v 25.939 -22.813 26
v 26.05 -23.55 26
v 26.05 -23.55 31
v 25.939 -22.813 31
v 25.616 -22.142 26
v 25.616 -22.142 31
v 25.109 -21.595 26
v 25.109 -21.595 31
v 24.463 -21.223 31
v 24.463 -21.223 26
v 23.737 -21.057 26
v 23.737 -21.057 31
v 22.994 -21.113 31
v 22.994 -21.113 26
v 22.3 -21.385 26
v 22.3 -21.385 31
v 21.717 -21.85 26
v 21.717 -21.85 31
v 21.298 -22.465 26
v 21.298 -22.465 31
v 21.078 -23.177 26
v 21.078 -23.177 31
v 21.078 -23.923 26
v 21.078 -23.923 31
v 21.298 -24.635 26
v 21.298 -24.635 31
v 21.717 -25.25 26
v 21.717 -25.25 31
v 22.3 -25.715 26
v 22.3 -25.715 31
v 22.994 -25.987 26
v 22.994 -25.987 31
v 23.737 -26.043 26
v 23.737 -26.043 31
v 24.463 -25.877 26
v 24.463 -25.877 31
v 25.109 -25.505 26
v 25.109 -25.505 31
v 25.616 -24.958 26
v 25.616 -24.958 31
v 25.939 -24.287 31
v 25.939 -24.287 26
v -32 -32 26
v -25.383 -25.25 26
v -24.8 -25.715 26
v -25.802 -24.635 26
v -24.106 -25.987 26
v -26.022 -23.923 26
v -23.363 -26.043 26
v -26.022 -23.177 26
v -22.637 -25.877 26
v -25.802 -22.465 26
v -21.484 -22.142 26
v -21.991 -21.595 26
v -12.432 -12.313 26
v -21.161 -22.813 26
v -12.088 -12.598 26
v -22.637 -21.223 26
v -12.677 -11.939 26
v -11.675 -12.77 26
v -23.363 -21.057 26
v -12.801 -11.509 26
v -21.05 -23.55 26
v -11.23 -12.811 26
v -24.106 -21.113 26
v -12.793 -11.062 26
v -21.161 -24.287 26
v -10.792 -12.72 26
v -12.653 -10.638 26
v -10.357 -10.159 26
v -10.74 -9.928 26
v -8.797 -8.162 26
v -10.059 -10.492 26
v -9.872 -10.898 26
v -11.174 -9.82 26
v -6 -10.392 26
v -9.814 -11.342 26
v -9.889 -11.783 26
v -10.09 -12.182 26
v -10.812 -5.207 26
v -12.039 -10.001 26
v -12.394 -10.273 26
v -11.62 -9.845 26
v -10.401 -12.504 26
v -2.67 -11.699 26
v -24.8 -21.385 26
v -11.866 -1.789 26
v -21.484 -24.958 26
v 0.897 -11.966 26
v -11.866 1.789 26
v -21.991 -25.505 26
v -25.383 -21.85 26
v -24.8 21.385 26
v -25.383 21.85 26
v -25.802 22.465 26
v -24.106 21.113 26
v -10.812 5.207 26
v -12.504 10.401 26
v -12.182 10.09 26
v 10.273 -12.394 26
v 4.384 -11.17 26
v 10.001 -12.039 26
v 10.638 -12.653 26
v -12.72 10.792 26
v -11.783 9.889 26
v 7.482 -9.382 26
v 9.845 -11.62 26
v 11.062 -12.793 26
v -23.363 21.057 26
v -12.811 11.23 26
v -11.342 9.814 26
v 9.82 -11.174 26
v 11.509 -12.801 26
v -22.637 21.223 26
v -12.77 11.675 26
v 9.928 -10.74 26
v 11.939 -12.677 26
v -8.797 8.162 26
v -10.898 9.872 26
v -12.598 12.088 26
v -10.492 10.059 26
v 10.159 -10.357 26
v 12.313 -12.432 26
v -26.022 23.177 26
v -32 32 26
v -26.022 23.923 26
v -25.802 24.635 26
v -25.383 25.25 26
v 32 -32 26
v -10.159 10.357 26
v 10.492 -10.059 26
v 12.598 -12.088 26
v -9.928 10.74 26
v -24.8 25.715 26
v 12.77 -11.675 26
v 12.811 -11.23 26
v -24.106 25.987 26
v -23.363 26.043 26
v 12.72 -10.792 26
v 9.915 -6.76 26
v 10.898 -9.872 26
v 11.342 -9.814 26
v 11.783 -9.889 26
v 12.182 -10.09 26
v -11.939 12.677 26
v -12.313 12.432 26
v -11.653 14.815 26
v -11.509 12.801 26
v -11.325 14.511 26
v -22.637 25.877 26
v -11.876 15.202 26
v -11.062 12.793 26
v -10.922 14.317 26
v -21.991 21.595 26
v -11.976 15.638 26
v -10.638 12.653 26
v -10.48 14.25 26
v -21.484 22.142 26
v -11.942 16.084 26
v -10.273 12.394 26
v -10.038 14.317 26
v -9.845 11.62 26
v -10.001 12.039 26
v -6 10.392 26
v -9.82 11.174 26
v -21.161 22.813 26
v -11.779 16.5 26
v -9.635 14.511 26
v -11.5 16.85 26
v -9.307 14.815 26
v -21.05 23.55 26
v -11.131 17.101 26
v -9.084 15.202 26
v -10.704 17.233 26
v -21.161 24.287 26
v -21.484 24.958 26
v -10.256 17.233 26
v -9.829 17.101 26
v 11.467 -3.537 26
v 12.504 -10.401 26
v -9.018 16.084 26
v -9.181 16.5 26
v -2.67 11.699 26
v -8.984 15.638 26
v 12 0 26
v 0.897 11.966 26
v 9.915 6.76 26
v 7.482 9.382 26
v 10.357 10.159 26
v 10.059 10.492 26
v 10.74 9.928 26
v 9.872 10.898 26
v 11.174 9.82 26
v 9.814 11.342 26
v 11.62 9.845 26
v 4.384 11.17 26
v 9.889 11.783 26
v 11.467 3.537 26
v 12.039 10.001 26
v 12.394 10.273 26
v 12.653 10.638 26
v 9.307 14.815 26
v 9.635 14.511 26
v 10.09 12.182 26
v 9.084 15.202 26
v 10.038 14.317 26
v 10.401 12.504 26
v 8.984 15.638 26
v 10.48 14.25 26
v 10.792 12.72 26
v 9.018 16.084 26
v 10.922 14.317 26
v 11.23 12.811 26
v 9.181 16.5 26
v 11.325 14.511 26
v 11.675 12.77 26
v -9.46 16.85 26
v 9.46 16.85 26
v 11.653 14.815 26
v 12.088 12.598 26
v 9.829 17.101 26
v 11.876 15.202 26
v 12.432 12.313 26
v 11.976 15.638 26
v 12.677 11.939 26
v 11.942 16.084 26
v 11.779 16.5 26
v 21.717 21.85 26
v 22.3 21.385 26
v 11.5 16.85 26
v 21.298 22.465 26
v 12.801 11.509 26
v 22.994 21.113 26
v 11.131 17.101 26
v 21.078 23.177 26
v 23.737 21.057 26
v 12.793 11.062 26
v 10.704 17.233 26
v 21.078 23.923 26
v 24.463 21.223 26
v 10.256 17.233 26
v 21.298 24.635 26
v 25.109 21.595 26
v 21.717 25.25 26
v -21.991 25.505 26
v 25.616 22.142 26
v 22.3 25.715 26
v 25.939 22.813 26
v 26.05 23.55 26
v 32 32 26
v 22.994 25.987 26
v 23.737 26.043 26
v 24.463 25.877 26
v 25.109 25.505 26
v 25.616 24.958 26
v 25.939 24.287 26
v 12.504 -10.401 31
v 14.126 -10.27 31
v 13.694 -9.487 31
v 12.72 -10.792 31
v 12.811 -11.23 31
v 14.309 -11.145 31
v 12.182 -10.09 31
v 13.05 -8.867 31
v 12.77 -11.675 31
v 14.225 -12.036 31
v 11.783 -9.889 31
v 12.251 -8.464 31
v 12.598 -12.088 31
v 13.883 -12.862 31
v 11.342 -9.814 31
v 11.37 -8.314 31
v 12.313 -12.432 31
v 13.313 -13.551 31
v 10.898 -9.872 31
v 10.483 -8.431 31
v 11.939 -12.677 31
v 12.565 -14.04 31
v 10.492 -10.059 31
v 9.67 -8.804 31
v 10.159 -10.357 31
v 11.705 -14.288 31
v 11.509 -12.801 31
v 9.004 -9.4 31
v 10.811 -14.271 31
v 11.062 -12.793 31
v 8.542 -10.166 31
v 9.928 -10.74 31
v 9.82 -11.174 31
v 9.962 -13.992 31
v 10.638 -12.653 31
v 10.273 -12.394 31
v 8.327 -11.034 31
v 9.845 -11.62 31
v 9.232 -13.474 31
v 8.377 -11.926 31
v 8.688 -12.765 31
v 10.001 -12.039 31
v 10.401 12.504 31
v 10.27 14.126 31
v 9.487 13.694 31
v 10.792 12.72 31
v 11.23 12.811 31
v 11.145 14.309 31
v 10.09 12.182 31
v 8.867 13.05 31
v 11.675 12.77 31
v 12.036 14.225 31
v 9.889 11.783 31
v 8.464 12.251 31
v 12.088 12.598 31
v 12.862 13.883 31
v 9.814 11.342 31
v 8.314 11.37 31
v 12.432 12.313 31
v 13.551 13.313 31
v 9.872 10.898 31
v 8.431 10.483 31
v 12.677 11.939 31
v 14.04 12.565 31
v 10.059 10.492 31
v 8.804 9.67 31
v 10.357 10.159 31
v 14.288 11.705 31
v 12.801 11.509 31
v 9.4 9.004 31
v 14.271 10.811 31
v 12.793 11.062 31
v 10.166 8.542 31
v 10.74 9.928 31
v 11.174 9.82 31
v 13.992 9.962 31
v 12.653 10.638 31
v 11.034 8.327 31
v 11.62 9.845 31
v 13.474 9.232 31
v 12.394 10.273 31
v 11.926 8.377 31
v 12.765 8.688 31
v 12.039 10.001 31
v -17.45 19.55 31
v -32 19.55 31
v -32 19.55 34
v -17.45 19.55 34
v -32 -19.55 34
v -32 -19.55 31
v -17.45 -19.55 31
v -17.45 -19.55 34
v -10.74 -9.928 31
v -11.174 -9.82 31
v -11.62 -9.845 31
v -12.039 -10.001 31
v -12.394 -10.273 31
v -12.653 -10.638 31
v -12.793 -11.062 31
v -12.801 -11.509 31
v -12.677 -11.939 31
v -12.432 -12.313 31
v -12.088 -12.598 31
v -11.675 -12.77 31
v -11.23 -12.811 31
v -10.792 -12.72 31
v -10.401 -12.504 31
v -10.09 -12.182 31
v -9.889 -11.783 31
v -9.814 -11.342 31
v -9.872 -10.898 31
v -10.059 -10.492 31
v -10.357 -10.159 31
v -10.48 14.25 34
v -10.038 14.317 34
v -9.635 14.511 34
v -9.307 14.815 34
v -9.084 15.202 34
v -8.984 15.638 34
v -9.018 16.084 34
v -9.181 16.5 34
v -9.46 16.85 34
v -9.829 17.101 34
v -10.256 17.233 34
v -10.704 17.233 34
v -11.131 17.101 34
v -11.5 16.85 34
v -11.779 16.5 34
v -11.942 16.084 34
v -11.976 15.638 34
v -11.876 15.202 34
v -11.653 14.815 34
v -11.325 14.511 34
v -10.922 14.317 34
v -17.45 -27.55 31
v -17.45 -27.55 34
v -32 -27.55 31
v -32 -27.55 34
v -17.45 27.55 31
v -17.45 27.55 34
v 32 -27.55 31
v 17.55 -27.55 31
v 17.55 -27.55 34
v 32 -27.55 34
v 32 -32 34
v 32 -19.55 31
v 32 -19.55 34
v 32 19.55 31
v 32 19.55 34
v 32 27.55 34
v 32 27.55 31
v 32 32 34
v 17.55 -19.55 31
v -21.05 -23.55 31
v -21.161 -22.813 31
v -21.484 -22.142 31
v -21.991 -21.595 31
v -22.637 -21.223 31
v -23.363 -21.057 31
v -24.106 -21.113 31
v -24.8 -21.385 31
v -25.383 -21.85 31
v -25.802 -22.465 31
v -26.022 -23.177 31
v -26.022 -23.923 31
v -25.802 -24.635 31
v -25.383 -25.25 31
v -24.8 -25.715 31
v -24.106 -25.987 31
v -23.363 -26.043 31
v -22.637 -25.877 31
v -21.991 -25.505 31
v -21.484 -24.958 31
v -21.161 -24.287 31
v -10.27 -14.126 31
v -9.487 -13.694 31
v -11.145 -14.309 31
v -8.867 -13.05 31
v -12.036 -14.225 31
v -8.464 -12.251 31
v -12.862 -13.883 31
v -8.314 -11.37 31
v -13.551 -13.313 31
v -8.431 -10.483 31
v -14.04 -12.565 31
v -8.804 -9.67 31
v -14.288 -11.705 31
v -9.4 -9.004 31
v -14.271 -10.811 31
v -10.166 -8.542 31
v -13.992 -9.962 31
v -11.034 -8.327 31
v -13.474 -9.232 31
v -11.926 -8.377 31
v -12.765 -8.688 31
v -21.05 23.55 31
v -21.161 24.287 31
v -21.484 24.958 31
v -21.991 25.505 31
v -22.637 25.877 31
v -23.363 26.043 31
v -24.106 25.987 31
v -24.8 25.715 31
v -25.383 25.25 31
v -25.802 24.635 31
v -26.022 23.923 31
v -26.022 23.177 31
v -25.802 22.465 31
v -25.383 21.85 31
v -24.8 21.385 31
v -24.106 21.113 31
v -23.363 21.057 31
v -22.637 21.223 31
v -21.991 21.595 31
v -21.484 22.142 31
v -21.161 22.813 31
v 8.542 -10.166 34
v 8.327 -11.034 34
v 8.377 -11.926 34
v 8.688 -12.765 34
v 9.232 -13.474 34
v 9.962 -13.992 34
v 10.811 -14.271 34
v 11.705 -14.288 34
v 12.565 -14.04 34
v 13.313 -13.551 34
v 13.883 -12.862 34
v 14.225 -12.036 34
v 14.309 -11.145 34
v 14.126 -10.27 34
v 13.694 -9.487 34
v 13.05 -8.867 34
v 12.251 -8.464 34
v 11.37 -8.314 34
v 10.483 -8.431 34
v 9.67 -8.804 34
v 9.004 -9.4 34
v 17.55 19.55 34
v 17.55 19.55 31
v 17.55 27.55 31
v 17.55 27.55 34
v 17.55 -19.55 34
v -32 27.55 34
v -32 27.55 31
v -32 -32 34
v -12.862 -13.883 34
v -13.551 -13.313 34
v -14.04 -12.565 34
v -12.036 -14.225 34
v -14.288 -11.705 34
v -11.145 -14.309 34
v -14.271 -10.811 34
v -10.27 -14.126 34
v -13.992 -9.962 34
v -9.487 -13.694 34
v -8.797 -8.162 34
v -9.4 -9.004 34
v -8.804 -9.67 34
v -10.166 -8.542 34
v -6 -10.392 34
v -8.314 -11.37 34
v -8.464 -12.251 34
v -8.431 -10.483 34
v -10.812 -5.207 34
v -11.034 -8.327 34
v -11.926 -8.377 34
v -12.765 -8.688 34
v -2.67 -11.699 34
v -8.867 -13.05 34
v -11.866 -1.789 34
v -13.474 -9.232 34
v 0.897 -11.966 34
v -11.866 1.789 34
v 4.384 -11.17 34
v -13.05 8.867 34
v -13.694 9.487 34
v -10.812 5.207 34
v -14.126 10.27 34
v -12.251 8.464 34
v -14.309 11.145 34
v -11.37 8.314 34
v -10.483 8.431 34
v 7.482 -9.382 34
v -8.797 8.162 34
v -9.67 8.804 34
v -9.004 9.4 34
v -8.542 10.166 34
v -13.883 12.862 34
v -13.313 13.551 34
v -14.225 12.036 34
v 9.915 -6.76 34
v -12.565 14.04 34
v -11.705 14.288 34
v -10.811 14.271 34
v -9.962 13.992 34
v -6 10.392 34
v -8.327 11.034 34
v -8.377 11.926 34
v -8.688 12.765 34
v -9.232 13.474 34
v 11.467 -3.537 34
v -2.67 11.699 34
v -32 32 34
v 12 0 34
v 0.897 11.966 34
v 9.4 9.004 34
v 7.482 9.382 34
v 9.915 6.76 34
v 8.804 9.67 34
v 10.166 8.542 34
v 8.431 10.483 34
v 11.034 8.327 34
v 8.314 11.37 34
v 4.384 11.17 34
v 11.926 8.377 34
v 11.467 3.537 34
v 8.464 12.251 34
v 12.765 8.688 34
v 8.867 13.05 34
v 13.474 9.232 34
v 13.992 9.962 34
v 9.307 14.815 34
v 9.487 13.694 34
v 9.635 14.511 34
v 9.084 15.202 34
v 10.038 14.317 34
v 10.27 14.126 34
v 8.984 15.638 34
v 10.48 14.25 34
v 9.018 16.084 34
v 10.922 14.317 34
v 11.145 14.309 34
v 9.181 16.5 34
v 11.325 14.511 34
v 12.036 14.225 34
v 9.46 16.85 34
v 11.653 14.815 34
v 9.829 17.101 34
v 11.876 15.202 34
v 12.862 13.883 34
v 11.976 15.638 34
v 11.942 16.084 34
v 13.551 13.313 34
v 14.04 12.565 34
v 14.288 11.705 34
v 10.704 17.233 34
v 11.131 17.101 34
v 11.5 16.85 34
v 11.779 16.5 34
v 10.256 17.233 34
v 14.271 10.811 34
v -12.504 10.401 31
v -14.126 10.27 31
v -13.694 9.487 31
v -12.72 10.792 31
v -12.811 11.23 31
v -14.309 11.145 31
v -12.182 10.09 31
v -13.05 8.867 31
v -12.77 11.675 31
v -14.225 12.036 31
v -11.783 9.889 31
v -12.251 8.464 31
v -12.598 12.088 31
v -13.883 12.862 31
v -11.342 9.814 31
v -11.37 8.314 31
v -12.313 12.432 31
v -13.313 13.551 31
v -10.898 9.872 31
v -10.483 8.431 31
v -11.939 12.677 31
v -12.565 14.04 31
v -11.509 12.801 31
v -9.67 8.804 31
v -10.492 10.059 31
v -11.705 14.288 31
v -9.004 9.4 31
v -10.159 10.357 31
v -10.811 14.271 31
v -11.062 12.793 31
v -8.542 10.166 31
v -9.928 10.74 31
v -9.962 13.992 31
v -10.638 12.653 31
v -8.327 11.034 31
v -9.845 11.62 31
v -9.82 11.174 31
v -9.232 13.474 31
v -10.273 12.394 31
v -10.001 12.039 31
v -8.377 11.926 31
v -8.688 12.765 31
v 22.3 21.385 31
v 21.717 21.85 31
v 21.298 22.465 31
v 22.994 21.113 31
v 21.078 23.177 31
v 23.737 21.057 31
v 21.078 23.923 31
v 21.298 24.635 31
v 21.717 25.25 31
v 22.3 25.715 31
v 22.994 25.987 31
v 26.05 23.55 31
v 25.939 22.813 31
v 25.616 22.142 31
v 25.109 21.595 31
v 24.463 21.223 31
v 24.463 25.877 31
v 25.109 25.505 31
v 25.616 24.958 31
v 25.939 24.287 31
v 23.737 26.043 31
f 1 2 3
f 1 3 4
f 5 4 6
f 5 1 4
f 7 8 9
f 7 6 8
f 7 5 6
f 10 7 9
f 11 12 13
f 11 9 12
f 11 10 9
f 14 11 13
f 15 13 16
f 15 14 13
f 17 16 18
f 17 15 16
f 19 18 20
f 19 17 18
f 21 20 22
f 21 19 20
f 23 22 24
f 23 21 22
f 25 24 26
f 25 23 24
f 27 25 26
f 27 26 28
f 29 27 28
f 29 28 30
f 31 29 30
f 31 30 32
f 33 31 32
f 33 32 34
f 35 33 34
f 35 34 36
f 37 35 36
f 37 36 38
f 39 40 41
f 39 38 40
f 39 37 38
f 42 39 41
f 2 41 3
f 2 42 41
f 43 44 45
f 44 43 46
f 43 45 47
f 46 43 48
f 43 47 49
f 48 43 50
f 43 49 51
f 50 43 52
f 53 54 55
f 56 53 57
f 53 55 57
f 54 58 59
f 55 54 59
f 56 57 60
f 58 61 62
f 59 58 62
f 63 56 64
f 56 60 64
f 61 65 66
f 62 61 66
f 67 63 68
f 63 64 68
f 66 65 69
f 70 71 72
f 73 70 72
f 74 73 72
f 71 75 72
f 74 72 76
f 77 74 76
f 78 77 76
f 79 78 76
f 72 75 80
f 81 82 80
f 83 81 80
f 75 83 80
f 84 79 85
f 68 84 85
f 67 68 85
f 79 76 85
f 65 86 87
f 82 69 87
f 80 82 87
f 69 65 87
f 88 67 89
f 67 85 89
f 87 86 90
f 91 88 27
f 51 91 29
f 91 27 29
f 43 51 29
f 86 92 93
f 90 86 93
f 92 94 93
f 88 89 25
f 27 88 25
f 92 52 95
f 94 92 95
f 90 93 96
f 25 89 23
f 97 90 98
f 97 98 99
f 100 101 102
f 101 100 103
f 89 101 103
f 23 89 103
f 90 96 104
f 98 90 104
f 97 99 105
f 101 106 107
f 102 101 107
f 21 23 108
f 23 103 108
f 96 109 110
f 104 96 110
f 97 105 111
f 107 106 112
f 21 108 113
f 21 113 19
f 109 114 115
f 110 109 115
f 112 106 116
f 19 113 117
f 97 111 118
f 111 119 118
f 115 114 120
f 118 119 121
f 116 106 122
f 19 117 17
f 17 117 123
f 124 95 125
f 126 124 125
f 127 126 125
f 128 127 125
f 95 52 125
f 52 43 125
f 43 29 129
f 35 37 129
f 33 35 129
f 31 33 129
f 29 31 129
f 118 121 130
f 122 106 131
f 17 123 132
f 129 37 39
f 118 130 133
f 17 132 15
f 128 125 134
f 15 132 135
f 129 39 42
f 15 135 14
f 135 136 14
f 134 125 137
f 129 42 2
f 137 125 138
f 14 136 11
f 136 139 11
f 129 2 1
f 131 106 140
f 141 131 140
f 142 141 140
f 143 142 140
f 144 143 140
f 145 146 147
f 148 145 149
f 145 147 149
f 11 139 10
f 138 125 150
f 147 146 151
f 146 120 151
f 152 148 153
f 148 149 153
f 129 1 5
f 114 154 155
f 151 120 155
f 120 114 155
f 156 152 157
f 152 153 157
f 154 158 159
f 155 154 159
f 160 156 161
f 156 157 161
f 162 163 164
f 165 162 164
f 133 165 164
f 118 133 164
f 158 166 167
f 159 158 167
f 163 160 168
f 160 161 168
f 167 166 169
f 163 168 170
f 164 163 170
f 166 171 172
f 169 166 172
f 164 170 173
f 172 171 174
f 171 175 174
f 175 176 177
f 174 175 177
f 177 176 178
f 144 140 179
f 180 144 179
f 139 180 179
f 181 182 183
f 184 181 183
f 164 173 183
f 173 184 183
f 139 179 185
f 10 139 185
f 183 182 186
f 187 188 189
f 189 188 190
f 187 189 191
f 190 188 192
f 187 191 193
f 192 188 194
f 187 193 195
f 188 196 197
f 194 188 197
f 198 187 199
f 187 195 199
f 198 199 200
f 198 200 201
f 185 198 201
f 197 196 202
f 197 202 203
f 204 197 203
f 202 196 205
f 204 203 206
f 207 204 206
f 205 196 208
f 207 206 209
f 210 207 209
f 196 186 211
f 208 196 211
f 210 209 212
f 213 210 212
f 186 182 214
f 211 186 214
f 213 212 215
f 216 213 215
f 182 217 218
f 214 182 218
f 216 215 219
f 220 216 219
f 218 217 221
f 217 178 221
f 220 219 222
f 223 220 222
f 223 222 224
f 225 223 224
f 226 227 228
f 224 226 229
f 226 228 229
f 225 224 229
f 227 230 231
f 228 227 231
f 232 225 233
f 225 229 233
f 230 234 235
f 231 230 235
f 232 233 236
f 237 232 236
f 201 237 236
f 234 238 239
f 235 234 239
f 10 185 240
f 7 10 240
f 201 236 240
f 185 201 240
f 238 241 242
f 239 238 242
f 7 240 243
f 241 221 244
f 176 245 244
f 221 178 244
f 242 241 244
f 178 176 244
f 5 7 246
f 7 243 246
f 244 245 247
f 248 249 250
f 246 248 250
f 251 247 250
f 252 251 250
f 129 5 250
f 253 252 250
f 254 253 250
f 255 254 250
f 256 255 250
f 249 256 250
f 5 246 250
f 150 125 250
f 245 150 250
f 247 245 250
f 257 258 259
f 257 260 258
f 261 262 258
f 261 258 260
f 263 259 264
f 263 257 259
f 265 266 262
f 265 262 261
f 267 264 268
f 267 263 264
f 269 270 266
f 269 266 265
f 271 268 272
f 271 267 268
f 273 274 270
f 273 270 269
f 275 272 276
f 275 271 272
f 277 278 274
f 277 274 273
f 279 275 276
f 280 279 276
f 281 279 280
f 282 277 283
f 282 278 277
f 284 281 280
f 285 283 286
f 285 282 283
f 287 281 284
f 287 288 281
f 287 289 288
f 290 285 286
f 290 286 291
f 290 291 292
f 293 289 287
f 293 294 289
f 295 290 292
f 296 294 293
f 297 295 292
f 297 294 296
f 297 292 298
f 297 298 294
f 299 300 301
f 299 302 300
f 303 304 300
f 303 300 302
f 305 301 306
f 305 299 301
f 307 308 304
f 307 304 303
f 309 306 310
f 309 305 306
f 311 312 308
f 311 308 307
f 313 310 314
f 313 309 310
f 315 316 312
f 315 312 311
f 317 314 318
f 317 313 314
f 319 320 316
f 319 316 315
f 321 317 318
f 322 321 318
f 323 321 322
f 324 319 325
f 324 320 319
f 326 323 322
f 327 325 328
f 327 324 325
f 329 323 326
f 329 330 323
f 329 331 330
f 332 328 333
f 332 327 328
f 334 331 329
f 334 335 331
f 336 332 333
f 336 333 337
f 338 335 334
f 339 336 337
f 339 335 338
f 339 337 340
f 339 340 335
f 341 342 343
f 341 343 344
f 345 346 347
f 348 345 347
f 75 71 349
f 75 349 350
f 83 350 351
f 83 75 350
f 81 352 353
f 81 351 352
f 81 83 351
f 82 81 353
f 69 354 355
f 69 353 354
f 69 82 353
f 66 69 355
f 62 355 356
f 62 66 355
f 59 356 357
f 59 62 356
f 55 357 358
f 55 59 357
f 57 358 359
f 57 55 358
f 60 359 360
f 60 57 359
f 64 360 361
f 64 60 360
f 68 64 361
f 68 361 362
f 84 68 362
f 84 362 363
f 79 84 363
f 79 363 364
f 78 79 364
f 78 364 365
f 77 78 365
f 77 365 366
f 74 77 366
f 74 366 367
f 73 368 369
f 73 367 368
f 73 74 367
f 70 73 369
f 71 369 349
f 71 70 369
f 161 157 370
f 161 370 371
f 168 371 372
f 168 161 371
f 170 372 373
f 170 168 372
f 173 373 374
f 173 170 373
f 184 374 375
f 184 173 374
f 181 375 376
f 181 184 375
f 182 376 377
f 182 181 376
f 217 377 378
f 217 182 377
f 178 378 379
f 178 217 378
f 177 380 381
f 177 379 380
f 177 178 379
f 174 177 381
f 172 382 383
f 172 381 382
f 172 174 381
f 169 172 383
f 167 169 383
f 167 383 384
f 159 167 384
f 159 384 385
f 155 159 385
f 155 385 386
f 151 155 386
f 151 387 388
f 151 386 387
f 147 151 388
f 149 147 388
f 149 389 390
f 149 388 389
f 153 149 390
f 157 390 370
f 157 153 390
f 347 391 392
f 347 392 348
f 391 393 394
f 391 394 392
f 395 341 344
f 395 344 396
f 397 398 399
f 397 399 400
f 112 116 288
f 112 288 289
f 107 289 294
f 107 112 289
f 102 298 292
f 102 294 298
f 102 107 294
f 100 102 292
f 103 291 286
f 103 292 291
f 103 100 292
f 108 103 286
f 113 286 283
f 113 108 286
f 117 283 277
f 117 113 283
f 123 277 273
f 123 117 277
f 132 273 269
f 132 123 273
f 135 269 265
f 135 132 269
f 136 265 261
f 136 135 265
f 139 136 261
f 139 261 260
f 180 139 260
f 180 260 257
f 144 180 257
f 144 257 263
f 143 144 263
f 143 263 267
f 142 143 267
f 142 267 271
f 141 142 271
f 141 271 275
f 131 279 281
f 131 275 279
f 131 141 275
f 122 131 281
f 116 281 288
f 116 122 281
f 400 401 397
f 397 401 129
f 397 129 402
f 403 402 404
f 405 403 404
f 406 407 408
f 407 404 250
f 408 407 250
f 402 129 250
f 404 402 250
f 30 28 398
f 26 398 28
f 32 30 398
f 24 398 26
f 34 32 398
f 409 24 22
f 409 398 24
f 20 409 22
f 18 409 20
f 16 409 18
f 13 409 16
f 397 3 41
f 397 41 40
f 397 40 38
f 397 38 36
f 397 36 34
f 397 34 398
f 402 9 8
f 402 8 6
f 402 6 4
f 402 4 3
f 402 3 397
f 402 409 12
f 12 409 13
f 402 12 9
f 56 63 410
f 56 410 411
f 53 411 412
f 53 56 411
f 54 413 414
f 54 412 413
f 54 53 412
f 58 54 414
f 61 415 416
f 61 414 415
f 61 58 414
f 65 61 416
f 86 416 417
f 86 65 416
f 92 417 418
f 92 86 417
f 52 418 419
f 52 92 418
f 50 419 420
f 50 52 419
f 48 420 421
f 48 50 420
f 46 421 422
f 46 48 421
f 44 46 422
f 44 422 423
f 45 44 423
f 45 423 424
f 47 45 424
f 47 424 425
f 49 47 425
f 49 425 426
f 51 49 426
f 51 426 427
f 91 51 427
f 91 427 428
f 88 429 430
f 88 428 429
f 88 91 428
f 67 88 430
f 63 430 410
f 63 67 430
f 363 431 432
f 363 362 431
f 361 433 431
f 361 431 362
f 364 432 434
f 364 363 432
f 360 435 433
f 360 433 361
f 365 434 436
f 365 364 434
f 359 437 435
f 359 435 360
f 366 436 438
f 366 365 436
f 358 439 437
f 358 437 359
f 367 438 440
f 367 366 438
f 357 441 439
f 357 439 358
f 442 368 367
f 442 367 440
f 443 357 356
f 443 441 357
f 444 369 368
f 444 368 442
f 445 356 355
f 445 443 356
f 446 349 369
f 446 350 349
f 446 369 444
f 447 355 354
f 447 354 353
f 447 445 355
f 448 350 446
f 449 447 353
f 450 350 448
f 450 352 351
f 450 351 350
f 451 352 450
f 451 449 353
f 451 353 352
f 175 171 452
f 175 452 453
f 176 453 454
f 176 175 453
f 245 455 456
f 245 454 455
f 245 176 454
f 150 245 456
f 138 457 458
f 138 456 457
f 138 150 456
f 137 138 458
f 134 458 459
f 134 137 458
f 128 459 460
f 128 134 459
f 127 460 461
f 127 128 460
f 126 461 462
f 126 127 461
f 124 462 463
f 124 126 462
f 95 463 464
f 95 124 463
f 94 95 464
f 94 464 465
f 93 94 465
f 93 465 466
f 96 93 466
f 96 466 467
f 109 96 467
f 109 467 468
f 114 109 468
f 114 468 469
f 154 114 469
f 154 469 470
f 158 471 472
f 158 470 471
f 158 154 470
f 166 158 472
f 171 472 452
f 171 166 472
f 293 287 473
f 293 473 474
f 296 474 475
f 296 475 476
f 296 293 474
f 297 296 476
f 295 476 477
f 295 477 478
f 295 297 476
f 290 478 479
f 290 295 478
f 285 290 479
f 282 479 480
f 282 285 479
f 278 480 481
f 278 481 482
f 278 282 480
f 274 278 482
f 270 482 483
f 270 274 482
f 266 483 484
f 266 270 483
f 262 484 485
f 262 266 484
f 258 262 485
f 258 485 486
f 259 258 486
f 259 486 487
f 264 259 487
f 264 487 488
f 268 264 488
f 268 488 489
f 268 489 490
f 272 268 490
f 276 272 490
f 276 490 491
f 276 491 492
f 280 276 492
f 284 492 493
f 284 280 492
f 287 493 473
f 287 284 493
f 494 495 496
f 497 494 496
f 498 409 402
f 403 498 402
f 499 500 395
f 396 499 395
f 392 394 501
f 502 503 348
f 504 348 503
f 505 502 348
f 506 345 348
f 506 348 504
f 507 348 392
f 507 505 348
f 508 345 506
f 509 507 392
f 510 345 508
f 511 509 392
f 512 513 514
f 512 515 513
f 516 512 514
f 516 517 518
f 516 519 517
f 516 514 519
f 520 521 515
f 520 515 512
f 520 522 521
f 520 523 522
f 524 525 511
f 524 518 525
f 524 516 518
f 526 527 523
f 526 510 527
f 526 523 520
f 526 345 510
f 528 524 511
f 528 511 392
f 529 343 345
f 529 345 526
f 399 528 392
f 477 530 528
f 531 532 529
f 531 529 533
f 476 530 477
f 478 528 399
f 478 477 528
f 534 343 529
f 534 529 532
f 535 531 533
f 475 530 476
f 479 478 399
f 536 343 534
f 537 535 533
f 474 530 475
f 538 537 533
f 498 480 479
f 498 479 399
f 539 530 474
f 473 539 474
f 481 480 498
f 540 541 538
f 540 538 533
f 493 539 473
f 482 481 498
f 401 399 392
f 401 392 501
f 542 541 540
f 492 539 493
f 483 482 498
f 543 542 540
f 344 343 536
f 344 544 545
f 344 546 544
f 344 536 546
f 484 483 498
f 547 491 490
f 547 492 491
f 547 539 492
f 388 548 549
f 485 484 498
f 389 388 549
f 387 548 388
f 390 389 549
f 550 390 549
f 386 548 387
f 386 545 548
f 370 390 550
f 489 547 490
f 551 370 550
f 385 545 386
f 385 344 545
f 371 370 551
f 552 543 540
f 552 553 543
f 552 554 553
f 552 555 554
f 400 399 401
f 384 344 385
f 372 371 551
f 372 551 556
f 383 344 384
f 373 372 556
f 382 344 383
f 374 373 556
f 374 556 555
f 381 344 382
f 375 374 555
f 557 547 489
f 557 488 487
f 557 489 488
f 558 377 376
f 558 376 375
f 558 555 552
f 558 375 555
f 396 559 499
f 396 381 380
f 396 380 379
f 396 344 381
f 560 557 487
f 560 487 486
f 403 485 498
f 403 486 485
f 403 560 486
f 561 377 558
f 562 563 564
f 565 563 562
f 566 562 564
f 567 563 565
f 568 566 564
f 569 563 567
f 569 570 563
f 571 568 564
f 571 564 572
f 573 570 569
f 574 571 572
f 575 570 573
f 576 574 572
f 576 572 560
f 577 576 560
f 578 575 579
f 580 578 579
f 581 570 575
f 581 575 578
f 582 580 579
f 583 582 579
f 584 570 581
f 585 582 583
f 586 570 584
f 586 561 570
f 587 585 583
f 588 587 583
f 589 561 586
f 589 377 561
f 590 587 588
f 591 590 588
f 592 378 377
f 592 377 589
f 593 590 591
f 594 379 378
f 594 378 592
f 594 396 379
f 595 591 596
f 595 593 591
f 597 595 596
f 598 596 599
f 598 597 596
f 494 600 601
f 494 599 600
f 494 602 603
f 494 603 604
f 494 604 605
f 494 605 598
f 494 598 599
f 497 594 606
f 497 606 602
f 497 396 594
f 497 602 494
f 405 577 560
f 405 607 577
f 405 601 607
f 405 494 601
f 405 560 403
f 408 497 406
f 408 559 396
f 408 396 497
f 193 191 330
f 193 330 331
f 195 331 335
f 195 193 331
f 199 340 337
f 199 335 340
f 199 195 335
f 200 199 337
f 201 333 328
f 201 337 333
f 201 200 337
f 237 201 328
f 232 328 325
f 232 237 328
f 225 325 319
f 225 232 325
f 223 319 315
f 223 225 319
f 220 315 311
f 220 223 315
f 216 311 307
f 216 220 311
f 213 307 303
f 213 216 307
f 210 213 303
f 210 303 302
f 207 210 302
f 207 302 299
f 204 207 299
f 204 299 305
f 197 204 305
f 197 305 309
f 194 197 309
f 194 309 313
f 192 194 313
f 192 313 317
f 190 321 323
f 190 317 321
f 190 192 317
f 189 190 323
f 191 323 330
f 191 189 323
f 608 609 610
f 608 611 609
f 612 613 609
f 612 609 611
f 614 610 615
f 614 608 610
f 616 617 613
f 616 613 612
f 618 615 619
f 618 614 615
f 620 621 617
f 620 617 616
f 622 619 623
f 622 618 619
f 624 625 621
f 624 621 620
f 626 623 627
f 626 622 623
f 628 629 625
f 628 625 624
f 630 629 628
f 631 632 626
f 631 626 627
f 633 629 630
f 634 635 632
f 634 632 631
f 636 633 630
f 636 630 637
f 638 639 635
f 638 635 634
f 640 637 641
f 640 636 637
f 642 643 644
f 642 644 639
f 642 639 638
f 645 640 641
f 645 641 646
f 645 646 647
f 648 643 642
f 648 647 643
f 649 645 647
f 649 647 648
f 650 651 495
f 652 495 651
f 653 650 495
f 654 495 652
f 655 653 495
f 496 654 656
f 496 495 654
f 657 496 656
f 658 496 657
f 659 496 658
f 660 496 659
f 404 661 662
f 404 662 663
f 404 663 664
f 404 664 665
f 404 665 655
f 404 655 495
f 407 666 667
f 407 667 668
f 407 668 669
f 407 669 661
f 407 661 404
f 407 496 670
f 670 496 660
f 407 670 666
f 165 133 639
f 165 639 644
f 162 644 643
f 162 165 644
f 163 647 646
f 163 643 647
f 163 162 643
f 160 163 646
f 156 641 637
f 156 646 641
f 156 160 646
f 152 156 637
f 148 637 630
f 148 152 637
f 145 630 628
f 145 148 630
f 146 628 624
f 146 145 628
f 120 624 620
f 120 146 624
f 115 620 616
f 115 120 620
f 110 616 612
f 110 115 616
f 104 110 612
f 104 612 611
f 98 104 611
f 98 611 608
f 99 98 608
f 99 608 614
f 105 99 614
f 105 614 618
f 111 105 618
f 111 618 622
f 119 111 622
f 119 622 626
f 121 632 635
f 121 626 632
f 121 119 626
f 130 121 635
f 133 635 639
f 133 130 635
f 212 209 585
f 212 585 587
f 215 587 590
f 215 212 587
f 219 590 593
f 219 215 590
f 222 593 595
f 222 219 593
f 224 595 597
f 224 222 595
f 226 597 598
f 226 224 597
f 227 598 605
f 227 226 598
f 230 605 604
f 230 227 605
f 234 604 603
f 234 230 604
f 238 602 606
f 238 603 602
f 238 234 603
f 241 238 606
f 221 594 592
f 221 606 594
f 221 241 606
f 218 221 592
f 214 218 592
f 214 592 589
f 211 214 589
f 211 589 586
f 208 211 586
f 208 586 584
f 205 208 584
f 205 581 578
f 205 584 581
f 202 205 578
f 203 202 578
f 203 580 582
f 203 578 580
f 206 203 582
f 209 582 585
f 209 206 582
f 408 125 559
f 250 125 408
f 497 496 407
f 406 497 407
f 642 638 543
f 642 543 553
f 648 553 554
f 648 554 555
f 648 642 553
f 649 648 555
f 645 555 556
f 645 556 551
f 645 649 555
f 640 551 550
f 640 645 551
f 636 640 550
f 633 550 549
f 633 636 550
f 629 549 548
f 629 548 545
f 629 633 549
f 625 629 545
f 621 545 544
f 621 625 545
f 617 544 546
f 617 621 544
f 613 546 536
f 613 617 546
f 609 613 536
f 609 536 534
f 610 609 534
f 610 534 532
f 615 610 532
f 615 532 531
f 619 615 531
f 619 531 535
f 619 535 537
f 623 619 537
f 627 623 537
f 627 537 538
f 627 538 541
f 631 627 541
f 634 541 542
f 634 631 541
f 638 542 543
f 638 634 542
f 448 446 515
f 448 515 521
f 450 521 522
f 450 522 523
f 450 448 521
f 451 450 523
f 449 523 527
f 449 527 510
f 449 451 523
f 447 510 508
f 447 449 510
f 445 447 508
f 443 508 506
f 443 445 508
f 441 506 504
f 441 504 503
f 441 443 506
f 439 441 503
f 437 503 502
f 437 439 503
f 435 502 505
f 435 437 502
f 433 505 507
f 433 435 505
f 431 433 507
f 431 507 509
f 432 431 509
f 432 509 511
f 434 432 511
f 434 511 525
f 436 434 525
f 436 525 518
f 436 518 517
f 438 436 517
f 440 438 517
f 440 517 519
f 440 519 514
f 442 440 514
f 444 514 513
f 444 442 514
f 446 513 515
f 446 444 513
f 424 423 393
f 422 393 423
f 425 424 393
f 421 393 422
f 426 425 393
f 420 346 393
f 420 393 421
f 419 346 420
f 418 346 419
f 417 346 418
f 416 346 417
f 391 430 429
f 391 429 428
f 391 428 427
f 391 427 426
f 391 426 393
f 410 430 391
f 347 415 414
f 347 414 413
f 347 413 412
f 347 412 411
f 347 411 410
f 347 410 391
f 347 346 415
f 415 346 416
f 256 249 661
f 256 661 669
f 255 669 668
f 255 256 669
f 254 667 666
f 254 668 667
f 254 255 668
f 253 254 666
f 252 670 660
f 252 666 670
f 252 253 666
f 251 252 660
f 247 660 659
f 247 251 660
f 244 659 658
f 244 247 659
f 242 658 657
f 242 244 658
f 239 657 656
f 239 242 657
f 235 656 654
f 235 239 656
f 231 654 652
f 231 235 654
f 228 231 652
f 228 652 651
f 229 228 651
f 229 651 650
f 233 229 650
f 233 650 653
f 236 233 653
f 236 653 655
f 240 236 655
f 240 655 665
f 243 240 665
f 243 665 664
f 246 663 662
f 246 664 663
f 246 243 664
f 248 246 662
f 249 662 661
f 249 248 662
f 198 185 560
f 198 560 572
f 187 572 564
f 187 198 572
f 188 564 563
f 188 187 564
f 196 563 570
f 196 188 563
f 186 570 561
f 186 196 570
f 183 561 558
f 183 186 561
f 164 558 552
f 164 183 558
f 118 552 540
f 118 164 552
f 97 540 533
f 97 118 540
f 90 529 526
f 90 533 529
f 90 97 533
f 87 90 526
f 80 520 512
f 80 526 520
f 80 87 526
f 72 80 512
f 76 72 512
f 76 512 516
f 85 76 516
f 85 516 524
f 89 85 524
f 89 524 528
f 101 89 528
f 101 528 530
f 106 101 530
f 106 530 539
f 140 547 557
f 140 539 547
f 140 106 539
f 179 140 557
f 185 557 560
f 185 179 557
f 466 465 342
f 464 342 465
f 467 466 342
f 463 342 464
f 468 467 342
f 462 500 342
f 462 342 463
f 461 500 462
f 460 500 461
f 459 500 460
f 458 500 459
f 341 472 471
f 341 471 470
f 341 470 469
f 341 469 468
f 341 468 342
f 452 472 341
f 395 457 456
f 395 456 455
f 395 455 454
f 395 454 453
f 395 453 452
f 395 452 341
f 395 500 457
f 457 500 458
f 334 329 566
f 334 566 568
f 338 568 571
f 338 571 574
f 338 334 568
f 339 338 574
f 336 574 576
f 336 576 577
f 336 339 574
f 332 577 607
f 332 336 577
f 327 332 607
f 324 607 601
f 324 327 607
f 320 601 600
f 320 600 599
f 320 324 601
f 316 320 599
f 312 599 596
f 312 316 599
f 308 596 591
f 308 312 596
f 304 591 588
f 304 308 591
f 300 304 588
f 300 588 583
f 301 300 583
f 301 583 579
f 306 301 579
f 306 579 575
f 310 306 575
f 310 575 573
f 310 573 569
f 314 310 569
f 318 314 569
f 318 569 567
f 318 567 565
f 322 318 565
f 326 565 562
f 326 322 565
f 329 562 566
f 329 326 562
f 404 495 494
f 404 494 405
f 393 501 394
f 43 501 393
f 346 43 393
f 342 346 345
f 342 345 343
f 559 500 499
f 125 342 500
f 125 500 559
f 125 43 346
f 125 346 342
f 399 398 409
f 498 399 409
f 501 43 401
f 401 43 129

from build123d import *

# Parameters (mm, degrees)
CYLINDER776_R                = 1.5
CYLINDER776_DEPTH            = 20
CYLINDER774_R                = 1.5
CYLINDER774_DEPTH            = 20
COMPOUND536_ROLL_ANGLE       = 90
COMPOUND536_PLACEMENT_ANGLE  = 90
BOX640_W                     = 16
BOX640_H                     = 8
BOX640_DEPTH                 = 3
BOX639_W                     = 16
BOX639_H                     = 8
BOX639_DEPTH                 = 3
BOX636_W                     = 16
BOX636_H                     = 8
BOX636_DEPTH                 = 3
BOX637_W                     = 16
BOX637_H                     = 8
BOX637_DEPTH                 = 3
CYLINDER1600_R               = 12
CYLINDER1600_DEPTH           = 20
CYLINDER1598_R               = 5
CYLINDER1598_DEPTH           = 4
CYLINDER1605_R               = 5
CYLINDER1605_DEPTH           = 4
CYLINDER1612_R               = 5
CYLINDER1612_DEPTH           = 4
CYLINDER1610_R               = 5
CYLINDER1610_DEPTH           = 4
CYLINDER1604_R               = 2.5
CYLINDER1604_DEPTH           = 20
CYLINDER1608_R               = 2.5
CYLINDER1608_DEPTH           = 20
CYLINDER1607_R               = 2.5
CYLINDER1607_DEPTH           = 20
CYLINDER1602_R               = 2.5
CYLINDER1602_DEPTH           = 20
CYLINDER1609_R               = 3
CYLINDER1609_DEPTH           = 3
CYLINDER1609_PLACEMENT_ANGLE = 22.5
CYLINDER1601_R               = 3
CYLINDER1601_DEPTH           = 3
CYLINDER1601_PLACEMENT_ANGLE = 67.5
CYLINDER1606_R               = 3
CYLINDER1606_DEPTH           = 3
CYLINDER1606_PLACEMENT_ANGLE = 202.5
CYLINDER1611_R               = 3
CYLINDER1611_DEPTH           = 3
CYLINDER1611_PLACEMENT_ANGLE = 112.5
COMPOUND801_PLACEMENT_ANGLE  = 45
CYLINDER1603_R               = 1.5
CYLINDER1603_DEPTH           = 30
CYLINDER1603_PLACEMENT_ANGLE = 22.5
CYLINDER1613_R               = 1.5
CYLINDER1613_DEPTH           = 30
CYLINDER1613_PLACEMENT_ANGLE = 67.5
CYLINDER1614_R               = 1.5
CYLINDER1614_DEPTH           = 30
CYLINDER1614_PLACEMENT_ANGLE = 202.5
CYLINDER1599_R               = 1.5
CYLINDER1599_DEPTH           = 30
CYLINDER1599_PLACEMENT_ANGLE = 112.5
COMPOUND802_PLACEMENT_ANGLE  = 45
BOX638_W                     = 64
BOX638_H                     = 64
BOX638_DEPTH                 = 8


with BuildPart() as v_lec776:
    # Cylinder776 → Cylinder776 (new body)
    with BuildSketch(Plane(origin=(15.75, 114, 59.48), x_dir=(-1, 0, 0), z_dir=(0, 1, 0))):
        Circle(CYLINDER776_R)
    extrude(amount=CYLINDER776_DEPTH)


with BuildPart() as compound536:
    # Cylinder774 → Cylinder774 (new body)
    with BuildSketch(Plane(origin=(15.75, 114, 38.52), x_dir=(-1, 0, 0), z_dir=(0, 1, 0))):
        Circle(CYLINDER774_R)
    extrude(amount=CYLINDER774_DEPTH)

    # Compound536: union Válec776
    add(v_lec776.part)


with BuildPart() as compound536_1:
    # Compound536 roll: moved
    add(compound536.part.rotate(Axis((0, 0, 0), (1, 0, 0)), COMPOUND536_ROLL_ANGLE))


with BuildPart() as compound536_2:
    # Compound536 placement: moved
    add(compound536_1.part.moved(Location((-49, 0, -96))).rotate(Axis((-49, 0, -96), (0, 0, 1)), COMPOUND536_PLACEMENT_ANGLE))


with BuildPart() as krychle640:
    # Box640 → Box640 (new body)
    with BuildSketch(Plane(origin=(17.55, -27.55, 31), x_dir=(1, 0, 0), z_dir=(0, 0, 1))):
        with Locations((8, 4)):
            Rectangle(BOX640_W, BOX640_H)
    extrude(amount=BOX640_DEPTH)


with BuildPart() as krychle639:
    # Box639 → Box639 (new body)
    with BuildSketch(Plane(origin=(-33.45, 19.55, 31), x_dir=(1, 0, 0), z_dir=(0, 0, 1))):
        with Locations((8, 4)):
            Rectangle(BOX639_W, BOX639_H)
    extrude(amount=BOX639_DEPTH)


with BuildPart() as krychle636:
    # Box636 → Box636 (new body)
    with BuildSketch(Plane(origin=(-33.45, -27.55, 31), x_dir=(1, 0, 0), z_dir=(0, 0, 1))):
        with Locations((8, 4)):
            Rectangle(BOX636_W, BOX636_H)
    extrude(amount=BOX636_DEPTH)


with BuildPart() as compound800:
    # Box637 → Box637 (new body)
    with BuildSketch(Plane(origin=(17.55, 19.55, 31), x_dir=(1, 0, 0), z_dir=(0, 0, 1))):
        with Locations((8, 4)):
            Rectangle(BOX637_W, BOX637_H)
    extrude(amount=BOX637_DEPTH)

    # Compound800: union Krychle640, Krychle639, Krychle636
    add(krychle640.part)
    add(krychle639.part)
    add(krychle636.part)


with BuildPart() as v_lec1600:
    # Cylinder1600 → Cylinder1600 (new body)
    with BuildSketch(Plane.XY.offset(15)):
        Circle(CYLINDER1600_R)
    extrude(amount=CYLINDER1600_DEPTH)


with BuildPart() as v_lec1598:
    # Cylinder1598 → Cylinder1598 (new body)
    with BuildSketch(Plane(origin=(23.55, 23.55, 26), x_dir=(1, 0, 0), z_dir=(0, 0, 1))):
        Circle(CYLINDER1598_R)
    extrude(amount=CYLINDER1598_DEPTH)


with BuildPart() as v_lec1605:
    # Cylinder1605 → Cylinder1605 (new body)
    with BuildSketch(Plane(origin=(23.55, -23.55, 26), x_dir=(1, 0, 0), z_dir=(0, 0, 1))):
        Circle(CYLINDER1605_R)
    extrude(amount=CYLINDER1605_DEPTH)


with BuildPart() as v_lec1612:
    # Cylinder1612 → Cylinder1612 (new body)
    with BuildSketch(Plane(origin=(-23.55, 23.55, 26), x_dir=(1, 0, 0), z_dir=(0, 0, 1))):
        Circle(CYLINDER1612_R)
    extrude(amount=CYLINDER1612_DEPTH)


with BuildPart() as compound799:
    # Cylinder1610 → Cylinder1610 (new body)
    with BuildSketch(Plane(origin=(-23.55, -23.55, 26), x_dir=(1, 0, 0), z_dir=(0, 0, 1))):
        Circle(CYLINDER1610_R)
    extrude(amount=CYLINDER1610_DEPTH)

    # Compound799: union Válec1598, Válec1605, Válec1612
    add(v_lec1598.part)
    add(v_lec1605.part)
    add(v_lec1612.part)


with BuildPart() as compound799_1:
    # Compound799 placement: moved
    add(compound799.part.moved(Location((0, 0, -50))))


with BuildPart() as v_lec1604:
    # Cylinder1604 → Cylinder1604 (new body)
    with BuildSketch(Plane(origin=(-23.55, 23.55, 20), x_dir=(1, 0, 0), z_dir=(0, 0, 1))):
        Circle(CYLINDER1604_R)
    extrude(amount=CYLINDER1604_DEPTH)


with BuildPart() as v_lec1608:
    # Cylinder1608 → Cylinder1608 (new body)
    with BuildSketch(Plane(origin=(-23.55, -23.55, 20), x_dir=(1, 0, 0), z_dir=(0, 0, 1))):
        Circle(CYLINDER1608_R)
    extrude(amount=CYLINDER1608_DEPTH)


with BuildPart() as v_lec1607:
    # Cylinder1607 → Cylinder1607 (new body)
    with BuildSketch(Plane(origin=(23.55, -23.55, 20), x_dir=(1, 0, 0), z_dir=(0, 0, 1))):
        Circle(CYLINDER1607_R)
    extrude(amount=CYLINDER1607_DEPTH)


with BuildPart() as compound798:
    # Cylinder1602 → Cylinder1602 (new body)
    with BuildSketch(Plane(origin=(23.55, 23.55, 20), x_dir=(1, 0, 0), z_dir=(0, 0, 1))):
        Circle(CYLINDER1602_R)
    extrude(amount=CYLINDER1602_DEPTH)

    # Compound798: union Válec1604, Válec1608, Válec1607
    add(v_lec1604.part)
    add(v_lec1608.part)
    add(v_lec1607.part)


with BuildPart() as v_lec1609:
    # Cylinder1609 → Cylinder1609 (new body)
    with BuildSketch(Plane.XY):
        Circle(CYLINDER1609_R)
    extrude(amount=CYLINDER1609_DEPTH)


with BuildPart() as v_lec1609_1:
    # Cylinder1609 placement: moved
    add(v_lec1609.part.moved(Location((-16, 0, 2))).rotate(Axis((-16, 0, 2), (0, 0, 1)), CYLINDER1609_PLACEMENT_ANGLE))


with BuildPart() as v_lec1601:
    # Cylinder1601 → Cylinder1601 (new body)
    with BuildSketch(Plane.XY):
        Circle(CYLINDER1601_R)
    extrude(amount=CYLINDER1601_DEPTH)


with BuildPart() as v_lec1601_1:
    # Cylinder1601 placement: moved
    add(v_lec1601.part.moved(Location((0, 16, 2))).rotate(Axis((0, 16, 2), (0, 0, -1)), CYLINDER1601_PLACEMENT_ANGLE))


with BuildPart() as v_lec1606:
    # Cylinder1606 → Cylinder1606 (new body)
    with BuildSketch(Plane.XY):
        Circle(CYLINDER1606_R)
    extrude(amount=CYLINDER1606_DEPTH)


with BuildPart() as v_lec1606_1:
    # Cylinder1606 placement: moved
    add(v_lec1606.part.moved(Location((16, 0, 2))).rotate(Axis((16, 0, 2), (0, 0, 1)), CYLINDER1606_PLACEMENT_ANGLE))


with BuildPart() as compound801:
    # Cylinder1611 → Cylinder1611 (new body)
    with BuildSketch(Plane.XY):
        Circle(CYLINDER1611_R)
    extrude(amount=CYLINDER1611_DEPTH)


with BuildPart() as compound801_1:
    # Cylinder1611 placement: moved
    add(compound801.part.moved(Location((0, -16, 2))).rotate(Axis((0, -16, 2), (0, 0, 1)), CYLINDER1611_PLACEMENT_ANGLE))

    # Compound801: union Válec1609, Válec1601, Válec1606
    add(v_lec1609_1.part)
    add(v_lec1601_1.part)
    add(v_lec1606_1.part)


with BuildPart() as compound801_2:
    # Compound801 placement: moved
    add(compound801_1.part.moved(Location((0, 0, 29))).rotate(Axis((0, 0, 29), (0, 0, 1)), COMPOUND801_PLACEMENT_ANGLE))


with BuildPart() as v_lec1603:
    # Cylinder1603 → Cylinder1603 (new body)
    with BuildSketch(Plane.XY):
        Circle(CYLINDER1603_R)
    extrude(amount=CYLINDER1603_DEPTH)


with BuildPart() as v_lec1603_1:
    # Cylinder1603 placement: moved
    add(v_lec1603.part.moved(Location((-16, 0, 2))).rotate(Axis((-16, 0, 2), (0, 0, 1)), CYLINDER1603_PLACEMENT_ANGLE))


with BuildPart() as v_lec1613:
    # Cylinder1613 → Cylinder1613 (new body)
    with BuildSketch(Plane.XY):
        Circle(CYLINDER1613_R)
    extrude(amount=CYLINDER1613_DEPTH)


with BuildPart() as v_lec1613_1:
    # Cylinder1613 placement: moved
    add(v_lec1613.part.moved(Location((0, 16, 2))).rotate(Axis((0, 16, 2), (0, 0, -1)), CYLINDER1613_PLACEMENT_ANGLE))


with BuildPart() as v_lec1614:
    # Cylinder1614 → Cylinder1614 (new body)
    with BuildSketch(Plane.XY):
        Circle(CYLINDER1614_R)
    extrude(amount=CYLINDER1614_DEPTH)


with BuildPart() as v_lec1614_1:
    # Cylinder1614 placement: moved
    add(v_lec1614.part.moved(Location((16, 0, 2))).rotate(Axis((16, 0, 2), (0, 0, 1)), CYLINDER1614_PLACEMENT_ANGLE))


with BuildPart() as compound802:
    # Cylinder1599 → Cylinder1599 (new body)
    with BuildSketch(Plane.XY):
        Circle(CYLINDER1599_R)
    extrude(amount=CYLINDER1599_DEPTH)


with BuildPart() as compound802_1:
    # Cylinder1599 placement: moved
    add(compound802.part.moved(Location((0, -16, 2))).rotate(Axis((0, -16, 2), (0, 0, 1)), CYLINDER1599_PLACEMENT_ANGLE))

    # Compound802: union Válec1603, Válec1613, Válec1614
    add(v_lec1603_1.part)
    add(v_lec1613_1.part)
    add(v_lec1614_1.part)


with BuildPart() as compound802_2:
    # Compound802 placement: moved
    add(compound802_1.part.moved(Location((0, 0, 14))).rotate(Axis((0, 0, 14), (0, 0, 1)), COMPOUND802_PLACEMENT_ANGLE))


with BuildPart() as cut179:
    # Box638 → Box638 (new body)
    with BuildSketch(Plane(origin=(-32, -32, 26), x_dir=(1, 0, 0), z_dir=(0, 0, 1))):
        with Locations((32, 32)):
            Rectangle(BOX638_W, BOX638_H)
    extrude(amount=BOX638_DEPTH)

    # Cut173: cut Compound802
    add(compound802_2.part, mode=Mode.SUBTRACT)

    # Cut174: cut Compound801
    add(compound801_2.part, mode=Mode.SUBTRACT)

    # Cut177: cut Compound798
    add(compound798.part, mode=Mode.SUBTRACT)

    # Cut175: cut Compound799
    add(compound799_1.part, mode=Mode.SUBTRACT)

    # Cut176: cut Válec1600
    add(v_lec1600.part, mode=Mode.SUBTRACT)

    # Cut178: cut Compound800
    add(compound800.part, mode=Mode.SUBTRACT)

    # Cut179: cut Compound536
    add(compound536_2.part, mode=Mode.SUBTRACT)


solid = cut179.part
